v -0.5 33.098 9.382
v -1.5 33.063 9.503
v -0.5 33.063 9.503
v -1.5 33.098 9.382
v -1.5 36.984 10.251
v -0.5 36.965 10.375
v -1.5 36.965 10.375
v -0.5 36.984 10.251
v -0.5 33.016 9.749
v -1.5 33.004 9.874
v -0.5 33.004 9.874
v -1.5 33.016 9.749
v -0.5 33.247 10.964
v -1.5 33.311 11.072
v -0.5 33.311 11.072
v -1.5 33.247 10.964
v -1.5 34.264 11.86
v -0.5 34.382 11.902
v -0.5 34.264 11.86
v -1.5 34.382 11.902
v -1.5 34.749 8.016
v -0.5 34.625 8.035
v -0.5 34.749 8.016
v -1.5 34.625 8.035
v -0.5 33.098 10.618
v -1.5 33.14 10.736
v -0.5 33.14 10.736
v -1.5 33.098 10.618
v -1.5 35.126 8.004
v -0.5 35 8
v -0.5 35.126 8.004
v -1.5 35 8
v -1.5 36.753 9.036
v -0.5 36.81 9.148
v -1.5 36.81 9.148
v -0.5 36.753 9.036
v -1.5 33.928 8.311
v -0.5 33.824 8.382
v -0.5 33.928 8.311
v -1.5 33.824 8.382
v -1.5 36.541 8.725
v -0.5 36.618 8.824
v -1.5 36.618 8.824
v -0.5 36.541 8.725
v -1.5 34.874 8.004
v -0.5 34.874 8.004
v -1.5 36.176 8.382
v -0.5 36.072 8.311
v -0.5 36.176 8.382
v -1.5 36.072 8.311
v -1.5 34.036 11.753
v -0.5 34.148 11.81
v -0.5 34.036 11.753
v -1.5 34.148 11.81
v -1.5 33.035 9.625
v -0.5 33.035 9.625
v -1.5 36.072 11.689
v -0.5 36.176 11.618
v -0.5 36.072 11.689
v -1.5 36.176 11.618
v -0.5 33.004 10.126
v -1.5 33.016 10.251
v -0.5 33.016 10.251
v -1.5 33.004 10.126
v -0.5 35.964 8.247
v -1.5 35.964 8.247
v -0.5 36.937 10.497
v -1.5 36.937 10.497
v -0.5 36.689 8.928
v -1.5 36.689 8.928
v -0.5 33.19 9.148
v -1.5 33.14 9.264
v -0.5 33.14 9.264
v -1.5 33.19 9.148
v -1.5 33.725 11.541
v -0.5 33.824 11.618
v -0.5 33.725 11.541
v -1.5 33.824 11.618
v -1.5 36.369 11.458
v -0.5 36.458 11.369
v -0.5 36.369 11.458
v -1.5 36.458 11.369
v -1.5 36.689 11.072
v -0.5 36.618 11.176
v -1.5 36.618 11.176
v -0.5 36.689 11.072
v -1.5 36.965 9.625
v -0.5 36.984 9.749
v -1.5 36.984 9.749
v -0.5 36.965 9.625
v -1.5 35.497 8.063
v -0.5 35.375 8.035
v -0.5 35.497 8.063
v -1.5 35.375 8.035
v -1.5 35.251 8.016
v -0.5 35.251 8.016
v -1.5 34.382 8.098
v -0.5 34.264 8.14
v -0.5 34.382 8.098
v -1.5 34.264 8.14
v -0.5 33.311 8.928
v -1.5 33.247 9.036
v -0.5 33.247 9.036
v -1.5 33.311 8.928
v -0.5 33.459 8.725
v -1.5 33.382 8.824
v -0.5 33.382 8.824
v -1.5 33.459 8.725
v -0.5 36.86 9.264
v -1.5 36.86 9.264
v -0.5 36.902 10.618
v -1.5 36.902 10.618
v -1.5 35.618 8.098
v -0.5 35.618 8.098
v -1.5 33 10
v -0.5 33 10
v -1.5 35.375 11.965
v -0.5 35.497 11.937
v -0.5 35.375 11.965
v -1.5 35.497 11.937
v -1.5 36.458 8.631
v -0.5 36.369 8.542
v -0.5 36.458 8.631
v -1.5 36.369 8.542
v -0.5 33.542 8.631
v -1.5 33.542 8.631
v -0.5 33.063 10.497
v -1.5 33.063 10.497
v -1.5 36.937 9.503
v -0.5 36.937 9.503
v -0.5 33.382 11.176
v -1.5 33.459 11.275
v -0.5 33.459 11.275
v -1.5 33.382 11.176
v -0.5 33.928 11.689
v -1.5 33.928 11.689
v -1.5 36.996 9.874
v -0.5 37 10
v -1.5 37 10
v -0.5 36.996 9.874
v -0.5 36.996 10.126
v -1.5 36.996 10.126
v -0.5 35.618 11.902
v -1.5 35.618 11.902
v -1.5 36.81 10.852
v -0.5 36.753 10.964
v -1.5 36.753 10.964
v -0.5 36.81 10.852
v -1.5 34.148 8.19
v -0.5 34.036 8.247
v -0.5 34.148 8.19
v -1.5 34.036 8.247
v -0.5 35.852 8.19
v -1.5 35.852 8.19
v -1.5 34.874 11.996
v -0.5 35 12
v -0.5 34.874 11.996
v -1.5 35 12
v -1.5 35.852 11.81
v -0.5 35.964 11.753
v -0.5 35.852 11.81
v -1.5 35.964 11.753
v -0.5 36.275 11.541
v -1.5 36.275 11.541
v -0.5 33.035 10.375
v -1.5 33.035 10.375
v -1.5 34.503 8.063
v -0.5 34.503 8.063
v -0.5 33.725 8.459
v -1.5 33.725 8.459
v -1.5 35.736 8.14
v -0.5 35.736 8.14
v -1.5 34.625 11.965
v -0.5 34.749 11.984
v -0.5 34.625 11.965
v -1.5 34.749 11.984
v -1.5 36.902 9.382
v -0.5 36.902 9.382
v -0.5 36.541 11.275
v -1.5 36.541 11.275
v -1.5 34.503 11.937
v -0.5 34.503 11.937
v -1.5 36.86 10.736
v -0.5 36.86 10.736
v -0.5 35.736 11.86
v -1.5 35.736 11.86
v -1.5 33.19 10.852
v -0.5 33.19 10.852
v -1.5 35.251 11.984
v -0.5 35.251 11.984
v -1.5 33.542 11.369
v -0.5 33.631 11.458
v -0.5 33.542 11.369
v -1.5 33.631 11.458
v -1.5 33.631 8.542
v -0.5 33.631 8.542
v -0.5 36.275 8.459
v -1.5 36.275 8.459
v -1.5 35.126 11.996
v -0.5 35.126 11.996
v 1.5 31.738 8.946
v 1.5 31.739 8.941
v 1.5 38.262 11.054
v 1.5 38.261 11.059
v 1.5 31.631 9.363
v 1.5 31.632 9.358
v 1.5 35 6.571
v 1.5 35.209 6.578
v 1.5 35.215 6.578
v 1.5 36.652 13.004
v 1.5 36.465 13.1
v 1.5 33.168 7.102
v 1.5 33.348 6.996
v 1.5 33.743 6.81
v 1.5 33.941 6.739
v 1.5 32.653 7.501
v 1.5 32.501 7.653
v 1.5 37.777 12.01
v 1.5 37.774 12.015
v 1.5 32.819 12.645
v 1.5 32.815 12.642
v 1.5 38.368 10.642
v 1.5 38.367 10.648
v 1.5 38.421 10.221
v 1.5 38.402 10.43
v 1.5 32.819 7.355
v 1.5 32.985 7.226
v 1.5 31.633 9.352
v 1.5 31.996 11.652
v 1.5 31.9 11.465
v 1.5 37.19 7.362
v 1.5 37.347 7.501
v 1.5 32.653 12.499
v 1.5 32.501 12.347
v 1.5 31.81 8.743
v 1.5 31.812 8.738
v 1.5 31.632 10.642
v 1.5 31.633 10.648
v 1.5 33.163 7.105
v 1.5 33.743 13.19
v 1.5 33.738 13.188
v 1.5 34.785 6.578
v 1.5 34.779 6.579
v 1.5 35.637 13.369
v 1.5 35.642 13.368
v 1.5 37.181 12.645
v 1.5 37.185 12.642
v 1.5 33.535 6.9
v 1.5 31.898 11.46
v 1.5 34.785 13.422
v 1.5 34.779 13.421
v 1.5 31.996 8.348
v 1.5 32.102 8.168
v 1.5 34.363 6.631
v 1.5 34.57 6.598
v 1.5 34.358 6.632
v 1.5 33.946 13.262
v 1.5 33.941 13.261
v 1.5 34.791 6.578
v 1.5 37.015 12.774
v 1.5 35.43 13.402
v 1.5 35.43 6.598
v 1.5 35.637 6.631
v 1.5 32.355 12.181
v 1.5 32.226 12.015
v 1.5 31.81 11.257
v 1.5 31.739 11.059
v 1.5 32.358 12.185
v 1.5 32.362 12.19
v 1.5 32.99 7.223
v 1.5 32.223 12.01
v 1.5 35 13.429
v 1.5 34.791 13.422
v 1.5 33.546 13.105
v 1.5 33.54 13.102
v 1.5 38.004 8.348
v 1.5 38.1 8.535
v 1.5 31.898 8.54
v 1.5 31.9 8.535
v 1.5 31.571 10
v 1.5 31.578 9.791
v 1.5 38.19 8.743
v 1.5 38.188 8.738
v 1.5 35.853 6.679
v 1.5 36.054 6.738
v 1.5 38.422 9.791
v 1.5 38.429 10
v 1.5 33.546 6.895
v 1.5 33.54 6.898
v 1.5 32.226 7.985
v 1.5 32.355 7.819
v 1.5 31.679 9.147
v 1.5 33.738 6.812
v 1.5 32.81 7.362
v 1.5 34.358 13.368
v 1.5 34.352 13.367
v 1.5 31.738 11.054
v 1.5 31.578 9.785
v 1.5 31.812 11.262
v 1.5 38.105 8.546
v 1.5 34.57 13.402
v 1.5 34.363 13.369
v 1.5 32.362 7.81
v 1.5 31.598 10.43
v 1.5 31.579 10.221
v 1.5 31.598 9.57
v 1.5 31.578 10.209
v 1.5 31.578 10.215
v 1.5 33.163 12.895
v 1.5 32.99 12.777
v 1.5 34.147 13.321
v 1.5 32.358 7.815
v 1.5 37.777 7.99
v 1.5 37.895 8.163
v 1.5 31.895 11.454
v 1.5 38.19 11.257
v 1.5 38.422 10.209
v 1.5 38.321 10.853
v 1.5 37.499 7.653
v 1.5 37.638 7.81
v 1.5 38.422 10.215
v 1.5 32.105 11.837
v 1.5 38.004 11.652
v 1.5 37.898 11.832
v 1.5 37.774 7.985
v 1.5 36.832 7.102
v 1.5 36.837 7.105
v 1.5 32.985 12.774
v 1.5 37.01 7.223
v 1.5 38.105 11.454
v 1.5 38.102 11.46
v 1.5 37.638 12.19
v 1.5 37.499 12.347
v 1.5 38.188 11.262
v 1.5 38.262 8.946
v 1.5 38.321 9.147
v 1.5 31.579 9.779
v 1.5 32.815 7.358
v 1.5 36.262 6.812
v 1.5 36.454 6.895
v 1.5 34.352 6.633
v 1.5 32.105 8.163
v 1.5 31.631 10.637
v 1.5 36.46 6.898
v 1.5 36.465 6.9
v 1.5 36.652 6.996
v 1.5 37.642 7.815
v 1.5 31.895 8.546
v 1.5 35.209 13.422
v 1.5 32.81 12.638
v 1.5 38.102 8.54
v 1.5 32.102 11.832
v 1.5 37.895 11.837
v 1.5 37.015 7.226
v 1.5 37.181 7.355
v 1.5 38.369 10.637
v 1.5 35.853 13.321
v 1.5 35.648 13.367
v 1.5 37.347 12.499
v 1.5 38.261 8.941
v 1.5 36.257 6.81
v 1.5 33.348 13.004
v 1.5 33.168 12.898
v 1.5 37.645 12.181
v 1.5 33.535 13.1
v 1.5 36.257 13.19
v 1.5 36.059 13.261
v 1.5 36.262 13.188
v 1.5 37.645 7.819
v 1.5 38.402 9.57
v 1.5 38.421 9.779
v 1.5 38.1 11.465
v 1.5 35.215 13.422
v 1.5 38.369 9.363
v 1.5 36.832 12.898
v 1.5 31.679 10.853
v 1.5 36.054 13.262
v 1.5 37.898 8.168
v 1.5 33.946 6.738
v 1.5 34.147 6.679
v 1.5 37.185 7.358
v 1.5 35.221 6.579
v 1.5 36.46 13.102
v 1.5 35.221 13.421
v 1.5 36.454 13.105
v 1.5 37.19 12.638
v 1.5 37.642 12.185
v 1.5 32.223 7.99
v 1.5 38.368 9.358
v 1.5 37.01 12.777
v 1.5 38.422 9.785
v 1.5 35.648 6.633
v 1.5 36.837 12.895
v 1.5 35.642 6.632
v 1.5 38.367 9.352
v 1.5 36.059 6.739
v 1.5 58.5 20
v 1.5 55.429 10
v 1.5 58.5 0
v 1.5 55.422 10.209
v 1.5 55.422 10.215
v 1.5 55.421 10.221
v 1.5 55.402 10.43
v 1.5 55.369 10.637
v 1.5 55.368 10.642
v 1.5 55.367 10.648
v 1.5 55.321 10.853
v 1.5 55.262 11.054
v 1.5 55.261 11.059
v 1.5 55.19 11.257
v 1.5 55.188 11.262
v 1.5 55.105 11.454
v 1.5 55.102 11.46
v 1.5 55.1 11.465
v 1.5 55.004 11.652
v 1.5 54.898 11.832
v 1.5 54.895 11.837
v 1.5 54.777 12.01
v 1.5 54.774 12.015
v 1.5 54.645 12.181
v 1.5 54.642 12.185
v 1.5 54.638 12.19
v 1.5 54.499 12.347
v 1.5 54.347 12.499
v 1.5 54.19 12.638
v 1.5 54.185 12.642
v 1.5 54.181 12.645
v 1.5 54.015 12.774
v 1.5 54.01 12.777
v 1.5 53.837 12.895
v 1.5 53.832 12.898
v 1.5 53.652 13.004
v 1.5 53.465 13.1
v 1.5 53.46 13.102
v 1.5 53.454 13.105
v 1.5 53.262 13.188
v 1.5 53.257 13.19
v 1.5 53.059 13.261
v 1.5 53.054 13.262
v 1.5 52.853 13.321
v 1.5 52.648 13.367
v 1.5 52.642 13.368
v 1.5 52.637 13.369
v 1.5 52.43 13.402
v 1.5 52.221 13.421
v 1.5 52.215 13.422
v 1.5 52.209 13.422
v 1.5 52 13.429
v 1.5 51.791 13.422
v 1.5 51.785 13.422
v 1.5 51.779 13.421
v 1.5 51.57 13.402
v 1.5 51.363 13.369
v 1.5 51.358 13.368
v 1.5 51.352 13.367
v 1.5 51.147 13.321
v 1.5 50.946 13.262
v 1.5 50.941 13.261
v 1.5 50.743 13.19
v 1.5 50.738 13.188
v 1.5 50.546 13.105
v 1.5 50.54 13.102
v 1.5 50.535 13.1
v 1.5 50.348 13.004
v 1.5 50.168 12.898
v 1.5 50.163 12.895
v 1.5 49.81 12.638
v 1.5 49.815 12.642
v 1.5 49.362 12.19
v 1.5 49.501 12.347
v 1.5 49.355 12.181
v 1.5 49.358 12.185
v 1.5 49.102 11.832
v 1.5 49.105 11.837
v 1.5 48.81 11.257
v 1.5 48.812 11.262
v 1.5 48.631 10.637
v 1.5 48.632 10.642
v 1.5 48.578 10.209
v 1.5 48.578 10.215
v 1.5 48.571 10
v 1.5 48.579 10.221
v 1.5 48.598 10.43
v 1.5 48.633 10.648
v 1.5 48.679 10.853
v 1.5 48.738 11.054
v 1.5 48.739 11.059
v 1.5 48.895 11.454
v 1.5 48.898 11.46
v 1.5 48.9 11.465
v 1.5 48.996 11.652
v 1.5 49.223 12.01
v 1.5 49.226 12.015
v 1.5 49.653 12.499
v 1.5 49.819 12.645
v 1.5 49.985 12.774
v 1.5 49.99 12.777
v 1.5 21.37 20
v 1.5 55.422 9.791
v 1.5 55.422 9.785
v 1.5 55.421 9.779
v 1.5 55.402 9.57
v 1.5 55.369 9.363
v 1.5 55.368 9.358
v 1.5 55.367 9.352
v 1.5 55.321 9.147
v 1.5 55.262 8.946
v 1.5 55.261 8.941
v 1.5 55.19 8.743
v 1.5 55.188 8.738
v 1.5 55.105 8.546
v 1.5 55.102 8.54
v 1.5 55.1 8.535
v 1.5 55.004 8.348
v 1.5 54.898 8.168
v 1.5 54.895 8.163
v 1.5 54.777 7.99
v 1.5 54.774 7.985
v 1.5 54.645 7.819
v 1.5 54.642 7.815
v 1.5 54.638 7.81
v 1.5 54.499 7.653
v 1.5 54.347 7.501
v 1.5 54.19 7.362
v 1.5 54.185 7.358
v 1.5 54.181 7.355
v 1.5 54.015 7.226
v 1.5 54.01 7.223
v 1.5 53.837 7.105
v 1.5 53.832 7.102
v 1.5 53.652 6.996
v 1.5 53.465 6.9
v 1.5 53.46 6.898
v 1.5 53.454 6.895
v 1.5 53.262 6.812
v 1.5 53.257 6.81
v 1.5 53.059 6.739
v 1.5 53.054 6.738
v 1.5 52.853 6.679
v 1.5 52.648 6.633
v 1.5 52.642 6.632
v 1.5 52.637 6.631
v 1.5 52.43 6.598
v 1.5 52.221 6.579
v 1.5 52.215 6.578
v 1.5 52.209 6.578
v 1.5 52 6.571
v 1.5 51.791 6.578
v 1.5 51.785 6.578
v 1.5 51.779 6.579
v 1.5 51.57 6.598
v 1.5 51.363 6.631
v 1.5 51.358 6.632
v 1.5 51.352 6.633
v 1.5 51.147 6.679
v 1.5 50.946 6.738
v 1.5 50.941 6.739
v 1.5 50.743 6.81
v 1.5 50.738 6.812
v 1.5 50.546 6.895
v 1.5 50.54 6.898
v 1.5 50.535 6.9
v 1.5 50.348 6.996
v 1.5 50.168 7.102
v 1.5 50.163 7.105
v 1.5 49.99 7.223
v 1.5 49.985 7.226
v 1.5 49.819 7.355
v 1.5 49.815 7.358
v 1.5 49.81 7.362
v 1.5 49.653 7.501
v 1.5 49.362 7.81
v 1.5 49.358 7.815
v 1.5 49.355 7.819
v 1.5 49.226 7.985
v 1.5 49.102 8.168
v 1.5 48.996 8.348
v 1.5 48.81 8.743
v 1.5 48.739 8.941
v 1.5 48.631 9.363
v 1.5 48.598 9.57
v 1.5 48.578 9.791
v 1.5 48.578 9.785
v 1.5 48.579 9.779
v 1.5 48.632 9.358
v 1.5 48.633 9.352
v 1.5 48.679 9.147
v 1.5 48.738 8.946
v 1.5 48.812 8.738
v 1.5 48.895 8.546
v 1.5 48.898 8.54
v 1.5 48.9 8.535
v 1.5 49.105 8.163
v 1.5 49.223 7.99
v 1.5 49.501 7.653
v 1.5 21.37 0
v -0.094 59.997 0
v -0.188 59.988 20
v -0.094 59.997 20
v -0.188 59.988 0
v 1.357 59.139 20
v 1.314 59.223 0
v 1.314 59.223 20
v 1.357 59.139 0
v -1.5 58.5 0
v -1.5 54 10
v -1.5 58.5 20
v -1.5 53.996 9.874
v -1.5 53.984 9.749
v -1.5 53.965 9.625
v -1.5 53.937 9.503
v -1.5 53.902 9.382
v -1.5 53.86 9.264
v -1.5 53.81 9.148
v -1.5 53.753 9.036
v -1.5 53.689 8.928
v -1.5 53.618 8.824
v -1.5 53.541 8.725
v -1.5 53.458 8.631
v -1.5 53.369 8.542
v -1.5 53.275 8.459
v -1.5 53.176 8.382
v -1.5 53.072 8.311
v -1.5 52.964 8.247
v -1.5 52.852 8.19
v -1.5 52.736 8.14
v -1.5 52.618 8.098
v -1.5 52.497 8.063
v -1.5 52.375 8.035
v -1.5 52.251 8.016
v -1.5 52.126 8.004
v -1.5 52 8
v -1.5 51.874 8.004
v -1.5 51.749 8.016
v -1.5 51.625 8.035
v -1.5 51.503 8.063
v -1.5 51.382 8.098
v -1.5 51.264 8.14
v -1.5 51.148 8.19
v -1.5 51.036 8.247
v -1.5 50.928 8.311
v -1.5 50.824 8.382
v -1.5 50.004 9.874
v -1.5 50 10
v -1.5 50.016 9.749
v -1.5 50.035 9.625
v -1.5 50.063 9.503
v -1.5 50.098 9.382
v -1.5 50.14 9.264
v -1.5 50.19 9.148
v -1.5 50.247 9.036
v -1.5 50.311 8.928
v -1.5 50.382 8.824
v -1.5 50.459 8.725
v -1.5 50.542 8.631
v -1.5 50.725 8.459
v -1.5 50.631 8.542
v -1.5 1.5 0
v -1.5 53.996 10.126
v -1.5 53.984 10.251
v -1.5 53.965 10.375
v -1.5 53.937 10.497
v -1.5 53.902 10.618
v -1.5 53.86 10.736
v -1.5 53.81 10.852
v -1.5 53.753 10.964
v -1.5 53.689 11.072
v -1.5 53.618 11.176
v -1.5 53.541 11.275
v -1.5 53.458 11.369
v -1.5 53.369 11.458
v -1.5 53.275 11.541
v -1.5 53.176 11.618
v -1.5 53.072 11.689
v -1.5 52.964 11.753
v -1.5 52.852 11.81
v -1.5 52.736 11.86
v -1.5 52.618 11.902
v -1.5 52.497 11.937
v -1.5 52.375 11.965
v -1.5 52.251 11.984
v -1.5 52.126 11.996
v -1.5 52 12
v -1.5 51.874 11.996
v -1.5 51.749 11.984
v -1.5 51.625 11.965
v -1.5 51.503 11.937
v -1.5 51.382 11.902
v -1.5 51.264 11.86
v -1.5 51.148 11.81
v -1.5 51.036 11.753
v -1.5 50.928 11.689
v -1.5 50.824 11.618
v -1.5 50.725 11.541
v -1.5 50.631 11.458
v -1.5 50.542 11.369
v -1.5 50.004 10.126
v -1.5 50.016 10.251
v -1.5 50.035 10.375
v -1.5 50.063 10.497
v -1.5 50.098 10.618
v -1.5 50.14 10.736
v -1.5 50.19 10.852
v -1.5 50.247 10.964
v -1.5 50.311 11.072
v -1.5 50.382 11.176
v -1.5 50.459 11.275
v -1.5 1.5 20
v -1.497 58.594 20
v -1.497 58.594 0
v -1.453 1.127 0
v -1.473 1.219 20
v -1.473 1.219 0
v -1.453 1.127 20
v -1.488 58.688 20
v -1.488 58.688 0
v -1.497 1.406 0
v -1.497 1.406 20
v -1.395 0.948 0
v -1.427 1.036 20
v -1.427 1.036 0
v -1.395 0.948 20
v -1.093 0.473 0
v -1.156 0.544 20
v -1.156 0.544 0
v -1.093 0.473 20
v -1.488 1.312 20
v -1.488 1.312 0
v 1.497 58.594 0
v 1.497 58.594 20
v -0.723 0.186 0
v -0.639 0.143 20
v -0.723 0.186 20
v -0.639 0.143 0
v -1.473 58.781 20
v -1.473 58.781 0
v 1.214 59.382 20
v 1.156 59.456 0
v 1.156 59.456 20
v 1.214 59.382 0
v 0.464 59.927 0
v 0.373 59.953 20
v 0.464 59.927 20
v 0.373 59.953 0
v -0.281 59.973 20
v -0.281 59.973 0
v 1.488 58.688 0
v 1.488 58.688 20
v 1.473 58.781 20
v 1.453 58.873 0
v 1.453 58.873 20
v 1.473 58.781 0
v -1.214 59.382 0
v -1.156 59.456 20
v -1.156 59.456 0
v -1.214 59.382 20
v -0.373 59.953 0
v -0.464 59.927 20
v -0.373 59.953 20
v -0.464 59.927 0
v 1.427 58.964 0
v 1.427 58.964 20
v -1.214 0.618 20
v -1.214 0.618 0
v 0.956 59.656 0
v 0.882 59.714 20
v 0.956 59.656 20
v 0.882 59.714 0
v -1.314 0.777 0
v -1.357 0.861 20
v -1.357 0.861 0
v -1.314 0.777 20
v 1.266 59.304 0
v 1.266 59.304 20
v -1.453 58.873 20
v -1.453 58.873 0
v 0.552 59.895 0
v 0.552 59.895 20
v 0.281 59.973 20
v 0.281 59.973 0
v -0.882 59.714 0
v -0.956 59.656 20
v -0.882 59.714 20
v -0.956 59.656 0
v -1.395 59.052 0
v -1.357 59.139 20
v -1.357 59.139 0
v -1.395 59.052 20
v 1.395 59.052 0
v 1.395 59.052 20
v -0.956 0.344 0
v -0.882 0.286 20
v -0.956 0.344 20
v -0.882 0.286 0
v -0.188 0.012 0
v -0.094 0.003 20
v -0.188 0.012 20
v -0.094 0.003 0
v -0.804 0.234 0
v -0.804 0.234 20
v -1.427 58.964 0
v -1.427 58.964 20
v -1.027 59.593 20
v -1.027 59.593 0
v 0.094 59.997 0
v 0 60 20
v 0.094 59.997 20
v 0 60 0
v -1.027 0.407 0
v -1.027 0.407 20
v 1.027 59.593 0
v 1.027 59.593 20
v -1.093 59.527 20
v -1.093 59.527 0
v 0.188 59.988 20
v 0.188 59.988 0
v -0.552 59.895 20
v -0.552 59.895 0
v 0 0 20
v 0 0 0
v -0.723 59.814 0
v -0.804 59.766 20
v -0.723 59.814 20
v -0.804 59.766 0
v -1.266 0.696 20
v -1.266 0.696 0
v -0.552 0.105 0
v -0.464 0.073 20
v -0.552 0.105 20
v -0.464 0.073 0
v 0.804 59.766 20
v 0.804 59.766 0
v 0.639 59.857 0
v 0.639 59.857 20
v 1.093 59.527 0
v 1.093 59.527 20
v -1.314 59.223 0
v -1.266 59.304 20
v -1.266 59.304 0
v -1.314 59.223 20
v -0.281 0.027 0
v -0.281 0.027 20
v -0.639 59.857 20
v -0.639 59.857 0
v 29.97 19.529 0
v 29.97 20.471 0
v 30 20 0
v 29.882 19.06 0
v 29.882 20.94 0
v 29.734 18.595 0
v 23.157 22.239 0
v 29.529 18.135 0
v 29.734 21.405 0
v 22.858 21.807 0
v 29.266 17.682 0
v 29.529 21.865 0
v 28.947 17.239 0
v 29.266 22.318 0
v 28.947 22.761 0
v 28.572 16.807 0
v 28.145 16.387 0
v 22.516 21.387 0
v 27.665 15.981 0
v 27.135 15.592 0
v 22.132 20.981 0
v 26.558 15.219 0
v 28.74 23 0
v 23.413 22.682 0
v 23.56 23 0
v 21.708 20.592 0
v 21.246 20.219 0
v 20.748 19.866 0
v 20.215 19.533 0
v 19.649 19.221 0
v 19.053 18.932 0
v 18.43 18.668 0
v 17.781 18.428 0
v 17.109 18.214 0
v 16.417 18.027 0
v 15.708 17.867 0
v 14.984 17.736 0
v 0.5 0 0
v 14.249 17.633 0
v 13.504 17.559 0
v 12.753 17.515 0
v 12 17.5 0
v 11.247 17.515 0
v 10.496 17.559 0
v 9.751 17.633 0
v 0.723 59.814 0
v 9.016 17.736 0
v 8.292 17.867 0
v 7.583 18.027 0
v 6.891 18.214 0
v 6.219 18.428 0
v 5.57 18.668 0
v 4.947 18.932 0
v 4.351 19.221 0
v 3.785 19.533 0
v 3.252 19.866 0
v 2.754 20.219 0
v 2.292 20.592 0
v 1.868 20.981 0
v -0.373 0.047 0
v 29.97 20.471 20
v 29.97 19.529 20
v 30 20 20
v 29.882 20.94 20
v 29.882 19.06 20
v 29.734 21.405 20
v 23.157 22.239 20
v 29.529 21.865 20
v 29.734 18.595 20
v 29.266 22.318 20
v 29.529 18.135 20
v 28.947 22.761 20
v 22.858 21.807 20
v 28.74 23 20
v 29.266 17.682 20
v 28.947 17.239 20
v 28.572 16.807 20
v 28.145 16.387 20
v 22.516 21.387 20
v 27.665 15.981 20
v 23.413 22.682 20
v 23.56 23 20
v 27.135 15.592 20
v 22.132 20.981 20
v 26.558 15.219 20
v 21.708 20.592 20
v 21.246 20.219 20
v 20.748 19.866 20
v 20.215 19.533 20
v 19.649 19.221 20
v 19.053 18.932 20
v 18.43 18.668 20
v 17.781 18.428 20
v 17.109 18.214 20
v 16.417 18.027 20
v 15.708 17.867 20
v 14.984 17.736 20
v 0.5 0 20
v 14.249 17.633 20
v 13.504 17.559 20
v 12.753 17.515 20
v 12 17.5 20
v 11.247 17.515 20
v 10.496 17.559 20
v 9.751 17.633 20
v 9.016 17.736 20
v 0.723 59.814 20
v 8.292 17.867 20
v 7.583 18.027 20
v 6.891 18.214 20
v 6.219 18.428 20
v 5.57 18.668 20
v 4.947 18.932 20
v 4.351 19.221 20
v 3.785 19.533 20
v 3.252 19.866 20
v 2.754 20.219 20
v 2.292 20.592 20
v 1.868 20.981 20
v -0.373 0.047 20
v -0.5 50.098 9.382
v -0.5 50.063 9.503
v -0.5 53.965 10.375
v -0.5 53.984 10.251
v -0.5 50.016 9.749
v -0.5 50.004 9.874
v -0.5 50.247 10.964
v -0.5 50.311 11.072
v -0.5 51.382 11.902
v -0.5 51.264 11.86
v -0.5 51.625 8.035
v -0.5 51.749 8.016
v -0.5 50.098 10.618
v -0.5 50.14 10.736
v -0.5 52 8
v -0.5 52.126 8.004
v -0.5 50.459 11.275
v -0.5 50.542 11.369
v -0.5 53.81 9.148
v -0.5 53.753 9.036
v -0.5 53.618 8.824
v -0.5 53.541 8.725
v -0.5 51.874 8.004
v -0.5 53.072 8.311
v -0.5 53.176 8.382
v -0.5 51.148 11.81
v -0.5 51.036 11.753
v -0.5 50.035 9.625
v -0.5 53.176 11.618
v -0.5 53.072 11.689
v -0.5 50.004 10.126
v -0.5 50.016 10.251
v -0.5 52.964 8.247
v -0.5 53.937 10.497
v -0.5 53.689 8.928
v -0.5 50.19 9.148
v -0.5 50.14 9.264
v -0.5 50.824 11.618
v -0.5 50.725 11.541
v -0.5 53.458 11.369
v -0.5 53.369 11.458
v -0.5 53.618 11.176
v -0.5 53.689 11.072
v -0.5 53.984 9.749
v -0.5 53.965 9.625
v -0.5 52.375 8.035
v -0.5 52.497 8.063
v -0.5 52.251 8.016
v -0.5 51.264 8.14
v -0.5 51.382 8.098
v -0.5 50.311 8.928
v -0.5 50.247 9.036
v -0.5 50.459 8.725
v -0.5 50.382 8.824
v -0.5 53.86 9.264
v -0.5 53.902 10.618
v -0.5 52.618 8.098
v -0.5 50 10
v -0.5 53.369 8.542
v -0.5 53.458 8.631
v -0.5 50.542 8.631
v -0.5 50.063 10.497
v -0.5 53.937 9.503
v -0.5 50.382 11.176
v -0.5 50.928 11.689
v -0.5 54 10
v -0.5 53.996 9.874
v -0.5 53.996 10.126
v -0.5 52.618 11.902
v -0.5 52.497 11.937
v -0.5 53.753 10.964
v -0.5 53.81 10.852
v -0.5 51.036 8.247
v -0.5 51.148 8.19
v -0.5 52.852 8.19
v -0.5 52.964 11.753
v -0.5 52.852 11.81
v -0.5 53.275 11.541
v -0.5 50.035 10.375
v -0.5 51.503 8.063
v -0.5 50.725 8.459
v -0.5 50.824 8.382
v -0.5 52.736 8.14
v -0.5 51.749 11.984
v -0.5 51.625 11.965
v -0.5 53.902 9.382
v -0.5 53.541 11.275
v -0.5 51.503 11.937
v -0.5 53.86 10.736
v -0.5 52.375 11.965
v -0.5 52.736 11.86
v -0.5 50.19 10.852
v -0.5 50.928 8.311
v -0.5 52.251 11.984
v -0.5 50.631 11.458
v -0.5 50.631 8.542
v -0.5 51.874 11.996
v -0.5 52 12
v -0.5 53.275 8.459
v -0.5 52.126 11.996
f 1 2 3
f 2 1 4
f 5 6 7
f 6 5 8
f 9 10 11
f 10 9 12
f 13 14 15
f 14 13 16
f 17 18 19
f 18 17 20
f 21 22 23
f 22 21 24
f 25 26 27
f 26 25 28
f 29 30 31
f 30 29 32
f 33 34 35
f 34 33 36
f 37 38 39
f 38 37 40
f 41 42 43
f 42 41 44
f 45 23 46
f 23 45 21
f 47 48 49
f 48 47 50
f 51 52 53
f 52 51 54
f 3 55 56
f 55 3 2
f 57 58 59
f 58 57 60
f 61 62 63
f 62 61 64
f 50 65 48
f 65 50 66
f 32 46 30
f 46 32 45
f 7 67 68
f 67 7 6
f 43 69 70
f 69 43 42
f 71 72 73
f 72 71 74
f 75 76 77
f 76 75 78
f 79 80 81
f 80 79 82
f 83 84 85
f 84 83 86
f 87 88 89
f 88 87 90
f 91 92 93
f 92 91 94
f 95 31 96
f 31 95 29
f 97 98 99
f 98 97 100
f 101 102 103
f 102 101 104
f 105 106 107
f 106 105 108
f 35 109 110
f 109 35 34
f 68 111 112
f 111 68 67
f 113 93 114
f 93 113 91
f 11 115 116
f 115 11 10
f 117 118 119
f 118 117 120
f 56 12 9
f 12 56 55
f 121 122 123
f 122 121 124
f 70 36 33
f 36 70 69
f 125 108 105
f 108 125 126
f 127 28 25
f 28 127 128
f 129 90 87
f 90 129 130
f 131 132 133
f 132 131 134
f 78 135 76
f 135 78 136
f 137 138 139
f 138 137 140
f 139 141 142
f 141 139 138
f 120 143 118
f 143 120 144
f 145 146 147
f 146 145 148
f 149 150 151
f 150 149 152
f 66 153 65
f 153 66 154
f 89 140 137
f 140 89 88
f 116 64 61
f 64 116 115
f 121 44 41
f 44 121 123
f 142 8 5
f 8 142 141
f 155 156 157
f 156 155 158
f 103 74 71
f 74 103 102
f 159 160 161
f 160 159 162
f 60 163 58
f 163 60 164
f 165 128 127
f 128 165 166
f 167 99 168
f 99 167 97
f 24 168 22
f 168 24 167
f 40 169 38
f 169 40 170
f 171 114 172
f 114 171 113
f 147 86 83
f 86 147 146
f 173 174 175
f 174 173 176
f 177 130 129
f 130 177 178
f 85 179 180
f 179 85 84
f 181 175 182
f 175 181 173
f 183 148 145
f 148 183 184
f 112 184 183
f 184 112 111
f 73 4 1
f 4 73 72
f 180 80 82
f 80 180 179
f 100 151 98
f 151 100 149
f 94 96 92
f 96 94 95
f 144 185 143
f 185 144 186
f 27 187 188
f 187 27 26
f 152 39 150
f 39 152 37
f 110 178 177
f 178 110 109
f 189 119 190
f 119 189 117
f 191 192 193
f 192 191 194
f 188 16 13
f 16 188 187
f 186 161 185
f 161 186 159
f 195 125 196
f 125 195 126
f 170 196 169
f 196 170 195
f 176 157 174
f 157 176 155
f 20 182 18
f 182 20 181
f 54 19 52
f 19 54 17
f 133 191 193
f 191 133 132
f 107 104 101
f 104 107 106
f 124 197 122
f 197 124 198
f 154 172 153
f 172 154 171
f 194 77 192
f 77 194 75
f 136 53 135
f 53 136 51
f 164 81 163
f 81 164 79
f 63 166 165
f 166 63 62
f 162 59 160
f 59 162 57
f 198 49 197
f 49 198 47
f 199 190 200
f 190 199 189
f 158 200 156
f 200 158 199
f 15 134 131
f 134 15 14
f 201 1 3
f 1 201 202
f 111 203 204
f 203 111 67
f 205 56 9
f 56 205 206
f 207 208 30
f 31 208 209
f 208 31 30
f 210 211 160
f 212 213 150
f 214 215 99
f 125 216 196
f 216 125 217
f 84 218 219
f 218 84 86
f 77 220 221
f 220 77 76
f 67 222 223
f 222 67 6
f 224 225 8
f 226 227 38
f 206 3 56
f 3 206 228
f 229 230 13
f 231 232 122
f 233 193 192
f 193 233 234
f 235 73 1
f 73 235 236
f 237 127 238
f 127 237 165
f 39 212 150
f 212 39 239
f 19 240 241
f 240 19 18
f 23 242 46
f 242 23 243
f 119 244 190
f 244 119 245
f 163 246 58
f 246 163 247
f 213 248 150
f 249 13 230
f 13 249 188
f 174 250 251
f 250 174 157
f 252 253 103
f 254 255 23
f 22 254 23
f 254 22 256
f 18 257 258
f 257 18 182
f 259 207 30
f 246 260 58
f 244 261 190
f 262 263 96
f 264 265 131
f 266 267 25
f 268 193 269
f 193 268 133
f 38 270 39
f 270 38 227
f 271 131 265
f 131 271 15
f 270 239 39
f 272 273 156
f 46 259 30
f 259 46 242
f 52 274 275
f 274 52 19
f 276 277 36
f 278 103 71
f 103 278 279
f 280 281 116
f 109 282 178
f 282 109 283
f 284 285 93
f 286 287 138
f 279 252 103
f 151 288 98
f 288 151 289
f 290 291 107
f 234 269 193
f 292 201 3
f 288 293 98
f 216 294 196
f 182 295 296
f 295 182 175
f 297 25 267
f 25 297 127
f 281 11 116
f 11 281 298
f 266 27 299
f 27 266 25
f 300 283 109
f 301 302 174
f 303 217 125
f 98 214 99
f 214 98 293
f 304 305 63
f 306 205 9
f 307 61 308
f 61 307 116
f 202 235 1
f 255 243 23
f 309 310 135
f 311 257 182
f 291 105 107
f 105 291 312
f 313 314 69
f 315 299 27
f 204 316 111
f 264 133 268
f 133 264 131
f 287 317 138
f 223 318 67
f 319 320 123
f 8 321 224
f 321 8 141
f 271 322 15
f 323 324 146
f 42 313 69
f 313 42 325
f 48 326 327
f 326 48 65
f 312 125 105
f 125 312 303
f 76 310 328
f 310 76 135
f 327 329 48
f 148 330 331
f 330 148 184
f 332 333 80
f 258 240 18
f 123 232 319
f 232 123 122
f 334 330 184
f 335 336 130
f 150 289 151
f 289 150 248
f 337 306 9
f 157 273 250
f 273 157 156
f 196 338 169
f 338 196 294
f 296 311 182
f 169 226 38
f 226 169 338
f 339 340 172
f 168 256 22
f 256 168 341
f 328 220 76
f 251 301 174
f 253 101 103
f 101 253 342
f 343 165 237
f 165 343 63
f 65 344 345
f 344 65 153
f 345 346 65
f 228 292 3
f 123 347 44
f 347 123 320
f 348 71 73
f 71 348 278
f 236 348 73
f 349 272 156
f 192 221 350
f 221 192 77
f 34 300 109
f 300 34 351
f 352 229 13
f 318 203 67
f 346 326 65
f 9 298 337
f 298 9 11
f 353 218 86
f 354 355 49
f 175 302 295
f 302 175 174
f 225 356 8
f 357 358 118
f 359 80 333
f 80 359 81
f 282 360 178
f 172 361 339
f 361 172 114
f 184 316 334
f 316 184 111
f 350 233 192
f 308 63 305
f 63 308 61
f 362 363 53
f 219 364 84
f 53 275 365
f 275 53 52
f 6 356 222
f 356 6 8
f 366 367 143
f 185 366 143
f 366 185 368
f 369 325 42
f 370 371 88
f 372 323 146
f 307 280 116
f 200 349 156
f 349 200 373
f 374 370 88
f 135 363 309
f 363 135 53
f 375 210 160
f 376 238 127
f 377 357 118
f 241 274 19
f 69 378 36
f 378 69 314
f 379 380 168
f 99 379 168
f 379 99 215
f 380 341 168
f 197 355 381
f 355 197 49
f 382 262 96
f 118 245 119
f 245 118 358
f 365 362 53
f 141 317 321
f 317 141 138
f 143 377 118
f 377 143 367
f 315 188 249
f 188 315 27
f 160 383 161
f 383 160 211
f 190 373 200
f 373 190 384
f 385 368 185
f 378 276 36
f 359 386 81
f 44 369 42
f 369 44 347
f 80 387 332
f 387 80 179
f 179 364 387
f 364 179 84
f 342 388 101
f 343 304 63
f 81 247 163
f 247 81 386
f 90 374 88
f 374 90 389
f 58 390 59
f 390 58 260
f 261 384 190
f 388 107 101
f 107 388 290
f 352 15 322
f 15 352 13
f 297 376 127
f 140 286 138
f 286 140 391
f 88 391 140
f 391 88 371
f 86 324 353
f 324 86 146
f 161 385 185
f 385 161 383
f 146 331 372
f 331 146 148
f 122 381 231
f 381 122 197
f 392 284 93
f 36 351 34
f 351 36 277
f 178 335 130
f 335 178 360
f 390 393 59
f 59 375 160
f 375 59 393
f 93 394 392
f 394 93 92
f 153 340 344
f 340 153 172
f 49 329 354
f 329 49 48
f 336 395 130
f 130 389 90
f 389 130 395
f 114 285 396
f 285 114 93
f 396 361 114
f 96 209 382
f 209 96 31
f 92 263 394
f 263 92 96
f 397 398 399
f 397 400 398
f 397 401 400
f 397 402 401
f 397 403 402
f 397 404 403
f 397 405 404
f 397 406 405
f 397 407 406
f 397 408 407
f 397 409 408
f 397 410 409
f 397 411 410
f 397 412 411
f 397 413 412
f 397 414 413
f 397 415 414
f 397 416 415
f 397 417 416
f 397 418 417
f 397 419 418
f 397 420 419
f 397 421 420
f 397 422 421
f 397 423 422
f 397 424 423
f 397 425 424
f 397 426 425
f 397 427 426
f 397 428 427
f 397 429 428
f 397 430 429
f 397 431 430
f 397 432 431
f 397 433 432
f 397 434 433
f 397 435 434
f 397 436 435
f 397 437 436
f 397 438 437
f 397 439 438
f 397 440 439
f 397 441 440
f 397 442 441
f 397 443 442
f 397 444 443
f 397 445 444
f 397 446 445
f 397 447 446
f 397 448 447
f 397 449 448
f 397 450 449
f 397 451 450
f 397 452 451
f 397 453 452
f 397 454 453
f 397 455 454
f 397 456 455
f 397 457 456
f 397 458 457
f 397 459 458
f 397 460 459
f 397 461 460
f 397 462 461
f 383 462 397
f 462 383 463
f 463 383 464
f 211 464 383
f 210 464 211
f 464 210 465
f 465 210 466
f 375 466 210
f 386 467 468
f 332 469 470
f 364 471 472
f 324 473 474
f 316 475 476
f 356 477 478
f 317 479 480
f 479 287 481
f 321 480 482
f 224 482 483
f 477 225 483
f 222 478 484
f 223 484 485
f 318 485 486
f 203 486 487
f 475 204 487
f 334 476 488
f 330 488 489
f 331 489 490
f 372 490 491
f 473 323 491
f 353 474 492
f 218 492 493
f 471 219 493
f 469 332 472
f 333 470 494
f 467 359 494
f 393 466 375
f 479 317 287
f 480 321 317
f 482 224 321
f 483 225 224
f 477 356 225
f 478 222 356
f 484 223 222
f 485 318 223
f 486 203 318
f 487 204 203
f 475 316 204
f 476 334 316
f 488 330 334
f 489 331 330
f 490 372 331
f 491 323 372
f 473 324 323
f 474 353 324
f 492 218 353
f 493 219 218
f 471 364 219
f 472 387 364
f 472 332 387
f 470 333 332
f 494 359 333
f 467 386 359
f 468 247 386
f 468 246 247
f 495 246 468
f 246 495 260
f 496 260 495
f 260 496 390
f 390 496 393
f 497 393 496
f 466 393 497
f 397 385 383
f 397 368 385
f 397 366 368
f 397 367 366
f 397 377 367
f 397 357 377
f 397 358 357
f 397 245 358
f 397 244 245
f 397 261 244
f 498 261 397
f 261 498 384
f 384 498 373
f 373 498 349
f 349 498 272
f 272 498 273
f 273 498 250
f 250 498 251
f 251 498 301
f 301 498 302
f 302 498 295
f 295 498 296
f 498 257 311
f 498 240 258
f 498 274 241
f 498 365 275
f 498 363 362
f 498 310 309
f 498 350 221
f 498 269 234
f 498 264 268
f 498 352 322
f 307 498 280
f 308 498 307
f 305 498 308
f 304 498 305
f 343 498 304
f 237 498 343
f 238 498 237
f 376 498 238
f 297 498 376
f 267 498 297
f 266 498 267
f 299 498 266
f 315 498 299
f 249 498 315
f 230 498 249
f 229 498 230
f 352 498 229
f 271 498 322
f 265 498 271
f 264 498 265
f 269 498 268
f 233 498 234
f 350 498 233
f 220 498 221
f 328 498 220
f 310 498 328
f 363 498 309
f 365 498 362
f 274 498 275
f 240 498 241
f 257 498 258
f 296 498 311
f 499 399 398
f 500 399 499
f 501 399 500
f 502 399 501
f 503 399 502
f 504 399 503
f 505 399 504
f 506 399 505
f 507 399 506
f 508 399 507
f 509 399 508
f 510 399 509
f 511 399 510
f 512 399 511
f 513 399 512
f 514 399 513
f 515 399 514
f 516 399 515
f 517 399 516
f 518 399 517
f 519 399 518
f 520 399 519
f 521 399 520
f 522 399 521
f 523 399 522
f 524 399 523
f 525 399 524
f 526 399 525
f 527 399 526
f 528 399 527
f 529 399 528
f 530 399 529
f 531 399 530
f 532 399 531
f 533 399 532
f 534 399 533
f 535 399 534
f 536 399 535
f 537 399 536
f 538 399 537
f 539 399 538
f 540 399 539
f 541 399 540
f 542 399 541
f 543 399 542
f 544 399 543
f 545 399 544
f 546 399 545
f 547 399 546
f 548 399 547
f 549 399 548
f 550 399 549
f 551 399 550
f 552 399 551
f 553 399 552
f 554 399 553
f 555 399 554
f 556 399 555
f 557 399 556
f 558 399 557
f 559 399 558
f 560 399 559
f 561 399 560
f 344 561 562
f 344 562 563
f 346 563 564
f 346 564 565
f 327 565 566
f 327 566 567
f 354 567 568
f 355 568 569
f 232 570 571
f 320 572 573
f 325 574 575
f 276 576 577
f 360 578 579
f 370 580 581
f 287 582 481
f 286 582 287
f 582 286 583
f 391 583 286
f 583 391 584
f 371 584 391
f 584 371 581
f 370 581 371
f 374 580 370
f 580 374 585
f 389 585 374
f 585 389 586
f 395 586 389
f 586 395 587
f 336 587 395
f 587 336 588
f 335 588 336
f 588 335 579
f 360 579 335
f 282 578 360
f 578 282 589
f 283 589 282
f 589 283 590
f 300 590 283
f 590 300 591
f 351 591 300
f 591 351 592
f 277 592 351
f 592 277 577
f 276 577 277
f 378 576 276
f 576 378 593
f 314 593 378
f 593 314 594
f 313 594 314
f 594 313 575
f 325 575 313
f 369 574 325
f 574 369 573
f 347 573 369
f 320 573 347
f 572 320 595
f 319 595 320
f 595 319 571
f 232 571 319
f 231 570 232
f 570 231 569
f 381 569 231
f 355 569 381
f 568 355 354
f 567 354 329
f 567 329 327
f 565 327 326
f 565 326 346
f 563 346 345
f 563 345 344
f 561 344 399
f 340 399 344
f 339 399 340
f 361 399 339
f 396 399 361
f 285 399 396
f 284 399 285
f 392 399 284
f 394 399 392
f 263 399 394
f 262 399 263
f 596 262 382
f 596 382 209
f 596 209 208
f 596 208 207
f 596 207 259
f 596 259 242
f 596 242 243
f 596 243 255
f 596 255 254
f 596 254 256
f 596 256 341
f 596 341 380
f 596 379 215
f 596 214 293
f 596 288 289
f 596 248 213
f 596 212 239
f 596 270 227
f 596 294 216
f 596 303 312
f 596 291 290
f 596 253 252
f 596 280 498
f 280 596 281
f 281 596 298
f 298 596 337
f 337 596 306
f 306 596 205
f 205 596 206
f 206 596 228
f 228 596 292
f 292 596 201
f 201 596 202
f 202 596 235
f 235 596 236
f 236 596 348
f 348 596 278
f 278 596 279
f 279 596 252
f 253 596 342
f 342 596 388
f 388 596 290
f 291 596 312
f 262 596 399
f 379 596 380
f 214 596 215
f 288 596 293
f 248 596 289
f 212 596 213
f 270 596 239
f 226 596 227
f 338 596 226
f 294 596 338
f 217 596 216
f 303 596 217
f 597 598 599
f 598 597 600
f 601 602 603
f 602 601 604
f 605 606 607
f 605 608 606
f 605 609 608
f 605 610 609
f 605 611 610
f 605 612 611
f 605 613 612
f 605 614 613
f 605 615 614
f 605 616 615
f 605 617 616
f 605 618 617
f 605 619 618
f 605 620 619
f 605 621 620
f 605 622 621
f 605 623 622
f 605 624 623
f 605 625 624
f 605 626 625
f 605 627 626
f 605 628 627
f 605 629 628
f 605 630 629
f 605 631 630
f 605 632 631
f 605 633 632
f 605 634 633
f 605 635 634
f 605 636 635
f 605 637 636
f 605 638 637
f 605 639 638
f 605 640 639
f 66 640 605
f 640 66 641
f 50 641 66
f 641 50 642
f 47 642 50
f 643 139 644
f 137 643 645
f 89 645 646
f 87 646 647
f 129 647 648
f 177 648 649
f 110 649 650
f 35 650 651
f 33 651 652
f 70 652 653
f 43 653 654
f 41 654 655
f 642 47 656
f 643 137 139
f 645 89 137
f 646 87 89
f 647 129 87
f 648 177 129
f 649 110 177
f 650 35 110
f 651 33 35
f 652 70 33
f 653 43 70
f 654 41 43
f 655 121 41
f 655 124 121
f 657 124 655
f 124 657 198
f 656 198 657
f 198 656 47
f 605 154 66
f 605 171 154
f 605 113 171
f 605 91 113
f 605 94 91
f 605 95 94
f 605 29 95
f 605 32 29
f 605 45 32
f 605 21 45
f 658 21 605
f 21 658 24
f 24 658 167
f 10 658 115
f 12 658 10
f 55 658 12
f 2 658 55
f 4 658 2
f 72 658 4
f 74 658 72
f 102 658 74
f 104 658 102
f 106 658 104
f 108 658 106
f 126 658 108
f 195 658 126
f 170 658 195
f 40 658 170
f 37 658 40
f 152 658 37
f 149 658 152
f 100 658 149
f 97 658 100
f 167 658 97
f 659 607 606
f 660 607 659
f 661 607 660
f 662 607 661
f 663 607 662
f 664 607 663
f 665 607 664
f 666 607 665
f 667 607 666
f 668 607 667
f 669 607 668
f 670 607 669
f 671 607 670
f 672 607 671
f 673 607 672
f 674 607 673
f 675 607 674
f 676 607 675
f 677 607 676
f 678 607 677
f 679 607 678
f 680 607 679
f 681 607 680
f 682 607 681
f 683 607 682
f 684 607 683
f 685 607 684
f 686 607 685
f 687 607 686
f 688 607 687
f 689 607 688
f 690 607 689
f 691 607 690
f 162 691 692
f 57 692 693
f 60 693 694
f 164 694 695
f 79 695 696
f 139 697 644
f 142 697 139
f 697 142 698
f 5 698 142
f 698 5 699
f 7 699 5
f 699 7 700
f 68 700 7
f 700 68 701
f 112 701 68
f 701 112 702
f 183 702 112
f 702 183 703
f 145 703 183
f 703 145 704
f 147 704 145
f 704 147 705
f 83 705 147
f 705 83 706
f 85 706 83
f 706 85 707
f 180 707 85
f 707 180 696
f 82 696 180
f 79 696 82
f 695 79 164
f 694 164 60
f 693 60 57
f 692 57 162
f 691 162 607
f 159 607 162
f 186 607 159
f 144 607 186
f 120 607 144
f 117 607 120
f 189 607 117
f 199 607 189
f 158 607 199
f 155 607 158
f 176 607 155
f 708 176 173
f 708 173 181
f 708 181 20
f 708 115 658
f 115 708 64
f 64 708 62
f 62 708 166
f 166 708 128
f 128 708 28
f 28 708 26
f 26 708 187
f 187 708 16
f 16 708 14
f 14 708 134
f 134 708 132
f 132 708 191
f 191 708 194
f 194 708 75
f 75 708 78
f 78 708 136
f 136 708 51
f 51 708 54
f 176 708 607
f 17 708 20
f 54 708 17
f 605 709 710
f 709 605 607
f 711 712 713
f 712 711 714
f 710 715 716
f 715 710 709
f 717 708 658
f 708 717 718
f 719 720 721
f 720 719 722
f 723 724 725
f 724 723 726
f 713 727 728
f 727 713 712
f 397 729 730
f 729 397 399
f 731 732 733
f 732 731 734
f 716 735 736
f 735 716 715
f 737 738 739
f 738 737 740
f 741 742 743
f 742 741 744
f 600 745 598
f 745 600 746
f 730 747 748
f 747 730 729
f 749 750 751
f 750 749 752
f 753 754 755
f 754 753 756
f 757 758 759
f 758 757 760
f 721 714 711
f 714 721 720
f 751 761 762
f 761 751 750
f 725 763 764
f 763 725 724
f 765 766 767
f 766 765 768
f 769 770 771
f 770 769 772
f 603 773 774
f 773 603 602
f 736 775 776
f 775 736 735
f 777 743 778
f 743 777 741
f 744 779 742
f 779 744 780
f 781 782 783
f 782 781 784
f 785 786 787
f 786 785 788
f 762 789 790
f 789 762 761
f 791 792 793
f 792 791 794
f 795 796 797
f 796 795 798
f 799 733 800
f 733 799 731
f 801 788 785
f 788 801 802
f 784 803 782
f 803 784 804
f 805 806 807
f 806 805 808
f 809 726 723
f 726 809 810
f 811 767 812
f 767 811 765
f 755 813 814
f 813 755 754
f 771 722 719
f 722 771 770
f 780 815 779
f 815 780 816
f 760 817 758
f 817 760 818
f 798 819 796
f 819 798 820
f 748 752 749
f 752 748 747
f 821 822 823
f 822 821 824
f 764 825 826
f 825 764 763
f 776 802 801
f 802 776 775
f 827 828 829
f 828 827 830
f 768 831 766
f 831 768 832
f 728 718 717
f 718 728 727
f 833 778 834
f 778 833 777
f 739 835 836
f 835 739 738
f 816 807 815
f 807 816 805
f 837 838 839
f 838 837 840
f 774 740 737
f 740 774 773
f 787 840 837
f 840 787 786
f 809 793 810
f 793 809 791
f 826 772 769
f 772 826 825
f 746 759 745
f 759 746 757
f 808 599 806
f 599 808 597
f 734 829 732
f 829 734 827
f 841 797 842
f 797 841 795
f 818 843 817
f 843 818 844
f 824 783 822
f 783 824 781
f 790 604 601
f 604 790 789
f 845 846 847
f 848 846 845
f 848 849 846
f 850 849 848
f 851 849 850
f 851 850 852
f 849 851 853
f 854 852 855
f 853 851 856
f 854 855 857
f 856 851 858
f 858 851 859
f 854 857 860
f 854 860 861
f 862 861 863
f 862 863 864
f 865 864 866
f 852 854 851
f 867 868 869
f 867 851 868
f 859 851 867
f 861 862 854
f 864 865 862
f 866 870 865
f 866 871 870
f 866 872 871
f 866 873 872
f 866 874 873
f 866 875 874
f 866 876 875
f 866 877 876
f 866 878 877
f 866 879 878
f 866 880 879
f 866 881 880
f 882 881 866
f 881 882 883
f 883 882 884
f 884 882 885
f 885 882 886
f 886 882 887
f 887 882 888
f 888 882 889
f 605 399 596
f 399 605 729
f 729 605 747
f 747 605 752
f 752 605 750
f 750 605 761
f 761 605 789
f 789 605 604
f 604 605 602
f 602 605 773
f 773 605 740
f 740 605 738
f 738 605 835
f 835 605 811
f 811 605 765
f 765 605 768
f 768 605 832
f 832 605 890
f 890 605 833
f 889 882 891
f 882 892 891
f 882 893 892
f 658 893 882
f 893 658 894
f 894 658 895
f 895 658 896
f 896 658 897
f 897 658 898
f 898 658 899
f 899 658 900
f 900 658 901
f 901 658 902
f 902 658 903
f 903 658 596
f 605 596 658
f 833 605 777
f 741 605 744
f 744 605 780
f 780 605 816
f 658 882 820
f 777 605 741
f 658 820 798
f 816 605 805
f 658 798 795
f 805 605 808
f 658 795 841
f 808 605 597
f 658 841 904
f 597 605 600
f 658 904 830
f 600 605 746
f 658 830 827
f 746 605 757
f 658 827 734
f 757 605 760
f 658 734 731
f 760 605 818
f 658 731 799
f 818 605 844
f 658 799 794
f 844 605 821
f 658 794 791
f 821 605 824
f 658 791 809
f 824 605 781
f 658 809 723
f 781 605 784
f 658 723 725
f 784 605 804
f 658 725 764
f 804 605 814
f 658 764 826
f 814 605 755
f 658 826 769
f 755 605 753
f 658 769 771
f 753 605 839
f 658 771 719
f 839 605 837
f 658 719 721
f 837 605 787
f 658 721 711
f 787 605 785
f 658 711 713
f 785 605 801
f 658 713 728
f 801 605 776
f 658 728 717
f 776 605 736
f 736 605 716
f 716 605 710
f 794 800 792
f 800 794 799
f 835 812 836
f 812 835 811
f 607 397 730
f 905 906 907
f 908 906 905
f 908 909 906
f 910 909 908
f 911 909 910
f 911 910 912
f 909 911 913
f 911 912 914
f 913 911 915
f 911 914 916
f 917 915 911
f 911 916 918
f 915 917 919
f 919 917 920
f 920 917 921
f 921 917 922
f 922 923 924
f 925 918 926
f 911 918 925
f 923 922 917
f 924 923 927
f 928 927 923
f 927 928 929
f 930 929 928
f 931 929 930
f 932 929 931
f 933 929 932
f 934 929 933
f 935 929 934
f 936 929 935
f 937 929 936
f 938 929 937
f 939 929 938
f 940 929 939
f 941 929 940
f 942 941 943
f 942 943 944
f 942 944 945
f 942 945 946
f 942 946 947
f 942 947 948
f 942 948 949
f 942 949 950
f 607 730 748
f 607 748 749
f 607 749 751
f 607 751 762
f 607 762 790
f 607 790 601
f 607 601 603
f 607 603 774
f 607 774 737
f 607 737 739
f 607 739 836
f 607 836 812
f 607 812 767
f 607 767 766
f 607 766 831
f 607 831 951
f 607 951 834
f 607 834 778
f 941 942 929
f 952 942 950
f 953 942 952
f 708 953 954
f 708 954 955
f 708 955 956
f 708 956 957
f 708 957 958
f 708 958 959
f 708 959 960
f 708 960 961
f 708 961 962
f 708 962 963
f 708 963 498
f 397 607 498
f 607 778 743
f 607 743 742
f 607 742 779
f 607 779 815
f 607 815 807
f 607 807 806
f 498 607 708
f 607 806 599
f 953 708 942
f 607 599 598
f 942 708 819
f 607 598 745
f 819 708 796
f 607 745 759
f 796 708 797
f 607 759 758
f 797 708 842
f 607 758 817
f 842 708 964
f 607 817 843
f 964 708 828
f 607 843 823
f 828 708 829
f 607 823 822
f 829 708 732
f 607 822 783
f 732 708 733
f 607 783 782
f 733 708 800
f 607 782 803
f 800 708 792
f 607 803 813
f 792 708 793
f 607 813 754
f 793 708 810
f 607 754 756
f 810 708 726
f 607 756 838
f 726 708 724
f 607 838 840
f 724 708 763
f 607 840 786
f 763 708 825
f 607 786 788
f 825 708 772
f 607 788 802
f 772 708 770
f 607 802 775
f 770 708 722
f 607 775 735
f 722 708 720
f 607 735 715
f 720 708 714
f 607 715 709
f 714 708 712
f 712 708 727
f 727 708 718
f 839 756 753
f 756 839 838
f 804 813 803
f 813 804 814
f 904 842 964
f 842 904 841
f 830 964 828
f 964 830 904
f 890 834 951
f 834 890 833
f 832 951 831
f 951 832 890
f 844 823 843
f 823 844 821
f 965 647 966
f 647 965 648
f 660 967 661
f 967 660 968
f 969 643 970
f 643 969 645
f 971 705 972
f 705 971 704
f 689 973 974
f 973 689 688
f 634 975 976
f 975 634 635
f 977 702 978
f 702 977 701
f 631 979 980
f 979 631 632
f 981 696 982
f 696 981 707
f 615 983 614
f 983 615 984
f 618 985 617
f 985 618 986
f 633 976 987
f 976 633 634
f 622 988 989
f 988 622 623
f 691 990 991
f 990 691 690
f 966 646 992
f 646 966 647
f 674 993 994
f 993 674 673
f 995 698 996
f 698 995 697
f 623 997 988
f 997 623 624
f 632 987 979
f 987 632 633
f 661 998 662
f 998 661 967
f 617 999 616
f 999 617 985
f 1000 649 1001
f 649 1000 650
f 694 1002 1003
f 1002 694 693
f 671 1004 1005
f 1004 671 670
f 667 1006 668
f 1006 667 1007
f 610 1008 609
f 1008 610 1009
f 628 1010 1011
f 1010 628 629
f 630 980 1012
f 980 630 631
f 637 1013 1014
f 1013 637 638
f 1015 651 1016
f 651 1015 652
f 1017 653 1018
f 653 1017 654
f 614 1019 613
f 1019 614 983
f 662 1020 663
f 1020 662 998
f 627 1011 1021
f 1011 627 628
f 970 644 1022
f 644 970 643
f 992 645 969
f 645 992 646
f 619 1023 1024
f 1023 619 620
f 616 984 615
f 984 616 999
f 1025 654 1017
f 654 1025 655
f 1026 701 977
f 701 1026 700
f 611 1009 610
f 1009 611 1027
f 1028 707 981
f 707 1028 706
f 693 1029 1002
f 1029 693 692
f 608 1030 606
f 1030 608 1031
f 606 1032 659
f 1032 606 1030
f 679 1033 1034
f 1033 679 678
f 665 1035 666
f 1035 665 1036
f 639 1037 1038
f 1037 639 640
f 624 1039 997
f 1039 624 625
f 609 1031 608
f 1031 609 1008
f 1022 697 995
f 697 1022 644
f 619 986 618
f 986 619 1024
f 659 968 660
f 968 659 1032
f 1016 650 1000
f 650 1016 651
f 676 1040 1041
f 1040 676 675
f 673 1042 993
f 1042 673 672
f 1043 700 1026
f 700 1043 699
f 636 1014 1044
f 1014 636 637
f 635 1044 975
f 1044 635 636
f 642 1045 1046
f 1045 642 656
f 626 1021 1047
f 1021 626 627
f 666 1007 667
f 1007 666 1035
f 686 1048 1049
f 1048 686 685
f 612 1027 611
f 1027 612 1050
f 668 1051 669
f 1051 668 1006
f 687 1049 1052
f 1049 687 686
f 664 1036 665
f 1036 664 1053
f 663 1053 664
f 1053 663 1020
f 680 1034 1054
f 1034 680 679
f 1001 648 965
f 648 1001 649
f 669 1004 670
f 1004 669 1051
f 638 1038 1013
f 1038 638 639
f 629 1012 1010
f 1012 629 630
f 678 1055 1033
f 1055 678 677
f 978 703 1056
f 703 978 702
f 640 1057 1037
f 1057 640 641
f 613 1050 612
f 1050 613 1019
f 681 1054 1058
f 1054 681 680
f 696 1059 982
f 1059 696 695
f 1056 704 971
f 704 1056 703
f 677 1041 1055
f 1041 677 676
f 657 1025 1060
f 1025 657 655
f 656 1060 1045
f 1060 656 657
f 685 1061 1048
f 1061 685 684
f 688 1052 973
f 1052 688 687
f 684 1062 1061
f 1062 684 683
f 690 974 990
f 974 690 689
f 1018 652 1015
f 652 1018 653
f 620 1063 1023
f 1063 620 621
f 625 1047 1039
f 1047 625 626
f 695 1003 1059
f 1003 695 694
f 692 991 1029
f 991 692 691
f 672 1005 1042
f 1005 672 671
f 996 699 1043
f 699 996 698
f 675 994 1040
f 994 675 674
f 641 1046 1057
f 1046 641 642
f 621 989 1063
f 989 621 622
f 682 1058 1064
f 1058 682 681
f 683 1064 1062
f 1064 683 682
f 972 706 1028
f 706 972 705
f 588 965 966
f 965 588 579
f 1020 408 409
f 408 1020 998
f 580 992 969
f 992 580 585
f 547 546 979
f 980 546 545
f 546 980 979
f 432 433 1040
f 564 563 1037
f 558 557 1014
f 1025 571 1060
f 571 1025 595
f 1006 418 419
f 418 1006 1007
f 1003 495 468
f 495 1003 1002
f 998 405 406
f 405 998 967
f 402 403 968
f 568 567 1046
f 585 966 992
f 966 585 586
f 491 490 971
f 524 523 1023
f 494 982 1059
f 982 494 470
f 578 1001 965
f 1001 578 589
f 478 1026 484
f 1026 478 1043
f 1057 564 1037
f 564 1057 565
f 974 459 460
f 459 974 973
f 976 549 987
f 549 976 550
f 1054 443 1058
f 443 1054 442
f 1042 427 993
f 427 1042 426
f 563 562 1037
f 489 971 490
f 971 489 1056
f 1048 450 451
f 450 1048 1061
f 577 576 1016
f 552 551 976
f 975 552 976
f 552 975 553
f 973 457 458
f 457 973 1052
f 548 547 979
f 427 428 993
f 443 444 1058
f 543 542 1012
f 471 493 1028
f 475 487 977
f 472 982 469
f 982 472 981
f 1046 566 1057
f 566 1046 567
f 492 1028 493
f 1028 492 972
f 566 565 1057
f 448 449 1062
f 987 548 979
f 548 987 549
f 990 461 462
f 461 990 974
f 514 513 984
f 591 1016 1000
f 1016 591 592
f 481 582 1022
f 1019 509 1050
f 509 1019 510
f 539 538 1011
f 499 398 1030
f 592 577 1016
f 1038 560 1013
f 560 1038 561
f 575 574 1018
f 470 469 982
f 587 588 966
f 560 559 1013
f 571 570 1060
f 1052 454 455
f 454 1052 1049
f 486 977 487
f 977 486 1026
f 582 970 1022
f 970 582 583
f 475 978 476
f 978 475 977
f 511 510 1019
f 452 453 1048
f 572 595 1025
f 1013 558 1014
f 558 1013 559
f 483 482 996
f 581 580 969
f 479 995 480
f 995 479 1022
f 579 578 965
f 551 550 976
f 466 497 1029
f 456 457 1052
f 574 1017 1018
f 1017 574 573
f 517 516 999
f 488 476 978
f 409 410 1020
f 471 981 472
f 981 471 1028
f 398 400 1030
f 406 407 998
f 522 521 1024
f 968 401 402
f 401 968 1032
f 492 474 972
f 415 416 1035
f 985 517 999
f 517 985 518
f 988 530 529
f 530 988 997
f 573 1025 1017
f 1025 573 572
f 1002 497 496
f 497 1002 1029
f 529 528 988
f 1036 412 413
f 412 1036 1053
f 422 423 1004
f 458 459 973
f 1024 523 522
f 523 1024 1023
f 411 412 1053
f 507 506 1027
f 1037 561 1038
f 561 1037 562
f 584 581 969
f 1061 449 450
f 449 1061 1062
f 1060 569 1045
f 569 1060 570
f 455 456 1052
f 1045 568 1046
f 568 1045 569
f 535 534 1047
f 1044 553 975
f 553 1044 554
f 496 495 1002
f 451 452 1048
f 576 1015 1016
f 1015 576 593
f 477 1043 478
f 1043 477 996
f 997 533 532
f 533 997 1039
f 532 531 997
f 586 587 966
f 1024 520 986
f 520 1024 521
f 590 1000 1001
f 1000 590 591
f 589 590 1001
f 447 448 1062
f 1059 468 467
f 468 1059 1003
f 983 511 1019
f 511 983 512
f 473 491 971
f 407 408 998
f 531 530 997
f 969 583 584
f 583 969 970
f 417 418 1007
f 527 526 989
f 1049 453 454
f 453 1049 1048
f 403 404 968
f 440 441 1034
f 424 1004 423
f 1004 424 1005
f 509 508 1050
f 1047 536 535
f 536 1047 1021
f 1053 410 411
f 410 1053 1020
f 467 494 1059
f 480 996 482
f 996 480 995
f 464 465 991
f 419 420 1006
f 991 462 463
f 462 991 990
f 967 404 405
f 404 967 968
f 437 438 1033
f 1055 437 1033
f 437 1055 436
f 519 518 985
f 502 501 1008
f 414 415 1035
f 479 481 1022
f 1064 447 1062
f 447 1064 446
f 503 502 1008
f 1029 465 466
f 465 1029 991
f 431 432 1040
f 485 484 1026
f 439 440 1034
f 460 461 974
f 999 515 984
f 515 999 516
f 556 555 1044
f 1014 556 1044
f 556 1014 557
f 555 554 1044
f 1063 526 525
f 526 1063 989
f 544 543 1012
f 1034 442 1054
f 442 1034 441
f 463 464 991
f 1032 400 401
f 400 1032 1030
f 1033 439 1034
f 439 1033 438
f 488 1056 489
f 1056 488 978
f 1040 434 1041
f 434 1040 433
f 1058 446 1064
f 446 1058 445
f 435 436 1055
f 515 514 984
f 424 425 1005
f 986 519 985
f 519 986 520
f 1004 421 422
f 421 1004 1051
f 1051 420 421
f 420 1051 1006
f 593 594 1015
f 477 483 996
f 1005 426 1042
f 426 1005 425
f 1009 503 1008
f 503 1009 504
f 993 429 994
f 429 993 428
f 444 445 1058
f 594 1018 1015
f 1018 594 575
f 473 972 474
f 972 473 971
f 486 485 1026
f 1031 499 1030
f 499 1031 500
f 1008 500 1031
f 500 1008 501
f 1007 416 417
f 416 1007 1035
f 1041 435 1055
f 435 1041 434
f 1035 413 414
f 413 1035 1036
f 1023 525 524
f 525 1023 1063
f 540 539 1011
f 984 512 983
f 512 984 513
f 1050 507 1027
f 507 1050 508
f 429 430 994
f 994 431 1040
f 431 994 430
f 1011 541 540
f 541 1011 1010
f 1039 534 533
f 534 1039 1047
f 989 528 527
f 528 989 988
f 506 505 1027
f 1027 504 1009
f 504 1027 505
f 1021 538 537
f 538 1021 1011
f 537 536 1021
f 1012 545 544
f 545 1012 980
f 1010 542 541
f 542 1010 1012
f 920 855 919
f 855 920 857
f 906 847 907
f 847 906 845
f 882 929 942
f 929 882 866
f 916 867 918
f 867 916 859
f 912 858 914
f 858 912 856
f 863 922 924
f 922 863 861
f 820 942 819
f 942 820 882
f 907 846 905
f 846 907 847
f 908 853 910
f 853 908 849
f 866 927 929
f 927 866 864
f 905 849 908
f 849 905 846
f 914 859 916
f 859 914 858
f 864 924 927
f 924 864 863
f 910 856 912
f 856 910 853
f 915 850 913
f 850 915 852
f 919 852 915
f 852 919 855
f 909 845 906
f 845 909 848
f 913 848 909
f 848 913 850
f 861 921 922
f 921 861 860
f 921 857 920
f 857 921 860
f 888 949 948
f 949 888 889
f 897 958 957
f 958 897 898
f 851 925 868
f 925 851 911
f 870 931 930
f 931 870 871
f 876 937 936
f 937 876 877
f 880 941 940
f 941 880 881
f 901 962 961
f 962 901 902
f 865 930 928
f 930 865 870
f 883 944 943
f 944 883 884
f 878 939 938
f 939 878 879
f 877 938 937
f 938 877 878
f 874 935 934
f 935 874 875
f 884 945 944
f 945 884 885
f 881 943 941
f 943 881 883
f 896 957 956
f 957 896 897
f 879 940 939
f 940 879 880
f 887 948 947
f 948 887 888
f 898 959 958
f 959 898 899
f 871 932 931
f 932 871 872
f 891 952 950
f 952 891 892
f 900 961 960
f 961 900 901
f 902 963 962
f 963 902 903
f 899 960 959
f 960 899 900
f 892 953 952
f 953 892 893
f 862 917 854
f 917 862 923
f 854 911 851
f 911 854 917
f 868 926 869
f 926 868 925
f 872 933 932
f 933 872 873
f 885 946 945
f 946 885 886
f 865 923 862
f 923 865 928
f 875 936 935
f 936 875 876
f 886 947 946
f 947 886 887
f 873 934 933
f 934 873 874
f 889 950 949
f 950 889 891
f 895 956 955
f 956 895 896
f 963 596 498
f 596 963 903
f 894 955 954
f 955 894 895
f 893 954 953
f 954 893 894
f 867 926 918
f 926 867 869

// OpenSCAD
// -----------------------------------------------------
// WandHaken (Kueche/Altglasbeutel)
//
//  Detlev Ahlgrimm, 06.2018
// -----------------------------------------------------

$fn=100;

// total height
height_total=60;  // [40:100]

// width
width=20;         // [8:30]

// depth
depth=30;         // [15:1:50]

// height for center@hook
height_hook=20;   // [10:40]

// number of holes
holes=2;          // [1:1:2]

// distance between first and second hole
hole_dist=17;     // [8:0.1:30]

module V2() {
  difference() {
    hull() {   // die Rueckwand
      translate([0, 1.5, 0]) cylinder(d=3, h=width);
      translate([0, height_total-1.5, 0]) cylinder(d=3, h=width);
    }
    translate([-1.6, height_total-8, width/2]) rotate([0, 90, 0]) cylinder(d=4, h=3.2);  // Befestigungsloch
    translate([-0.5, height_total-8, width/2]) rotate([0, 90, 0]) cylinder(d1=4, d2=7, h=2.1); // Loch anphasen fuer Schraubenkopf

    if(holes>1) {
      translate([-1.6, height_total-8-hole_dist, width/2]) rotate([0, 90, 0]) cylinder(d=4, h=3.2);
      translate([-0.5, height_total-8-hole_dist, width/2]) rotate([0, 90, 0]) cylinder(d1=4, d2=7, h=2.1);
    }
  }
  difference() {
    hull() {    // der Ausleger mit Verdickung unten
      difference() {   // der Ausleger
        translate([depth/2, height_hook, 0]) scale([2, 1, 1]) cylinder(d=depth/2, h=width);
        translate([-depth/2, 0, -0.1]) cube([depth/2, height_total, width+0.2]);
      }
      cube([0.5, 10, width]);  // der Ansatz fuer die Verdickung unten
    }
    translate([(depth/2*1.6)/2, height_hook+5, -0.1]) scale([1.6, 1, 1]) cylinder(d=depth/2, h=width+0.2);  // Ausleger zum Haken machen
    translate([depth/2, height_hook+3, -0.1]) cube([depth, 10, width+0.2]);   // die Spitze vom Haken abflachen
  }
}
V2();

//%translate([depth, 0, 0]) cube([1, height_total, width]);
